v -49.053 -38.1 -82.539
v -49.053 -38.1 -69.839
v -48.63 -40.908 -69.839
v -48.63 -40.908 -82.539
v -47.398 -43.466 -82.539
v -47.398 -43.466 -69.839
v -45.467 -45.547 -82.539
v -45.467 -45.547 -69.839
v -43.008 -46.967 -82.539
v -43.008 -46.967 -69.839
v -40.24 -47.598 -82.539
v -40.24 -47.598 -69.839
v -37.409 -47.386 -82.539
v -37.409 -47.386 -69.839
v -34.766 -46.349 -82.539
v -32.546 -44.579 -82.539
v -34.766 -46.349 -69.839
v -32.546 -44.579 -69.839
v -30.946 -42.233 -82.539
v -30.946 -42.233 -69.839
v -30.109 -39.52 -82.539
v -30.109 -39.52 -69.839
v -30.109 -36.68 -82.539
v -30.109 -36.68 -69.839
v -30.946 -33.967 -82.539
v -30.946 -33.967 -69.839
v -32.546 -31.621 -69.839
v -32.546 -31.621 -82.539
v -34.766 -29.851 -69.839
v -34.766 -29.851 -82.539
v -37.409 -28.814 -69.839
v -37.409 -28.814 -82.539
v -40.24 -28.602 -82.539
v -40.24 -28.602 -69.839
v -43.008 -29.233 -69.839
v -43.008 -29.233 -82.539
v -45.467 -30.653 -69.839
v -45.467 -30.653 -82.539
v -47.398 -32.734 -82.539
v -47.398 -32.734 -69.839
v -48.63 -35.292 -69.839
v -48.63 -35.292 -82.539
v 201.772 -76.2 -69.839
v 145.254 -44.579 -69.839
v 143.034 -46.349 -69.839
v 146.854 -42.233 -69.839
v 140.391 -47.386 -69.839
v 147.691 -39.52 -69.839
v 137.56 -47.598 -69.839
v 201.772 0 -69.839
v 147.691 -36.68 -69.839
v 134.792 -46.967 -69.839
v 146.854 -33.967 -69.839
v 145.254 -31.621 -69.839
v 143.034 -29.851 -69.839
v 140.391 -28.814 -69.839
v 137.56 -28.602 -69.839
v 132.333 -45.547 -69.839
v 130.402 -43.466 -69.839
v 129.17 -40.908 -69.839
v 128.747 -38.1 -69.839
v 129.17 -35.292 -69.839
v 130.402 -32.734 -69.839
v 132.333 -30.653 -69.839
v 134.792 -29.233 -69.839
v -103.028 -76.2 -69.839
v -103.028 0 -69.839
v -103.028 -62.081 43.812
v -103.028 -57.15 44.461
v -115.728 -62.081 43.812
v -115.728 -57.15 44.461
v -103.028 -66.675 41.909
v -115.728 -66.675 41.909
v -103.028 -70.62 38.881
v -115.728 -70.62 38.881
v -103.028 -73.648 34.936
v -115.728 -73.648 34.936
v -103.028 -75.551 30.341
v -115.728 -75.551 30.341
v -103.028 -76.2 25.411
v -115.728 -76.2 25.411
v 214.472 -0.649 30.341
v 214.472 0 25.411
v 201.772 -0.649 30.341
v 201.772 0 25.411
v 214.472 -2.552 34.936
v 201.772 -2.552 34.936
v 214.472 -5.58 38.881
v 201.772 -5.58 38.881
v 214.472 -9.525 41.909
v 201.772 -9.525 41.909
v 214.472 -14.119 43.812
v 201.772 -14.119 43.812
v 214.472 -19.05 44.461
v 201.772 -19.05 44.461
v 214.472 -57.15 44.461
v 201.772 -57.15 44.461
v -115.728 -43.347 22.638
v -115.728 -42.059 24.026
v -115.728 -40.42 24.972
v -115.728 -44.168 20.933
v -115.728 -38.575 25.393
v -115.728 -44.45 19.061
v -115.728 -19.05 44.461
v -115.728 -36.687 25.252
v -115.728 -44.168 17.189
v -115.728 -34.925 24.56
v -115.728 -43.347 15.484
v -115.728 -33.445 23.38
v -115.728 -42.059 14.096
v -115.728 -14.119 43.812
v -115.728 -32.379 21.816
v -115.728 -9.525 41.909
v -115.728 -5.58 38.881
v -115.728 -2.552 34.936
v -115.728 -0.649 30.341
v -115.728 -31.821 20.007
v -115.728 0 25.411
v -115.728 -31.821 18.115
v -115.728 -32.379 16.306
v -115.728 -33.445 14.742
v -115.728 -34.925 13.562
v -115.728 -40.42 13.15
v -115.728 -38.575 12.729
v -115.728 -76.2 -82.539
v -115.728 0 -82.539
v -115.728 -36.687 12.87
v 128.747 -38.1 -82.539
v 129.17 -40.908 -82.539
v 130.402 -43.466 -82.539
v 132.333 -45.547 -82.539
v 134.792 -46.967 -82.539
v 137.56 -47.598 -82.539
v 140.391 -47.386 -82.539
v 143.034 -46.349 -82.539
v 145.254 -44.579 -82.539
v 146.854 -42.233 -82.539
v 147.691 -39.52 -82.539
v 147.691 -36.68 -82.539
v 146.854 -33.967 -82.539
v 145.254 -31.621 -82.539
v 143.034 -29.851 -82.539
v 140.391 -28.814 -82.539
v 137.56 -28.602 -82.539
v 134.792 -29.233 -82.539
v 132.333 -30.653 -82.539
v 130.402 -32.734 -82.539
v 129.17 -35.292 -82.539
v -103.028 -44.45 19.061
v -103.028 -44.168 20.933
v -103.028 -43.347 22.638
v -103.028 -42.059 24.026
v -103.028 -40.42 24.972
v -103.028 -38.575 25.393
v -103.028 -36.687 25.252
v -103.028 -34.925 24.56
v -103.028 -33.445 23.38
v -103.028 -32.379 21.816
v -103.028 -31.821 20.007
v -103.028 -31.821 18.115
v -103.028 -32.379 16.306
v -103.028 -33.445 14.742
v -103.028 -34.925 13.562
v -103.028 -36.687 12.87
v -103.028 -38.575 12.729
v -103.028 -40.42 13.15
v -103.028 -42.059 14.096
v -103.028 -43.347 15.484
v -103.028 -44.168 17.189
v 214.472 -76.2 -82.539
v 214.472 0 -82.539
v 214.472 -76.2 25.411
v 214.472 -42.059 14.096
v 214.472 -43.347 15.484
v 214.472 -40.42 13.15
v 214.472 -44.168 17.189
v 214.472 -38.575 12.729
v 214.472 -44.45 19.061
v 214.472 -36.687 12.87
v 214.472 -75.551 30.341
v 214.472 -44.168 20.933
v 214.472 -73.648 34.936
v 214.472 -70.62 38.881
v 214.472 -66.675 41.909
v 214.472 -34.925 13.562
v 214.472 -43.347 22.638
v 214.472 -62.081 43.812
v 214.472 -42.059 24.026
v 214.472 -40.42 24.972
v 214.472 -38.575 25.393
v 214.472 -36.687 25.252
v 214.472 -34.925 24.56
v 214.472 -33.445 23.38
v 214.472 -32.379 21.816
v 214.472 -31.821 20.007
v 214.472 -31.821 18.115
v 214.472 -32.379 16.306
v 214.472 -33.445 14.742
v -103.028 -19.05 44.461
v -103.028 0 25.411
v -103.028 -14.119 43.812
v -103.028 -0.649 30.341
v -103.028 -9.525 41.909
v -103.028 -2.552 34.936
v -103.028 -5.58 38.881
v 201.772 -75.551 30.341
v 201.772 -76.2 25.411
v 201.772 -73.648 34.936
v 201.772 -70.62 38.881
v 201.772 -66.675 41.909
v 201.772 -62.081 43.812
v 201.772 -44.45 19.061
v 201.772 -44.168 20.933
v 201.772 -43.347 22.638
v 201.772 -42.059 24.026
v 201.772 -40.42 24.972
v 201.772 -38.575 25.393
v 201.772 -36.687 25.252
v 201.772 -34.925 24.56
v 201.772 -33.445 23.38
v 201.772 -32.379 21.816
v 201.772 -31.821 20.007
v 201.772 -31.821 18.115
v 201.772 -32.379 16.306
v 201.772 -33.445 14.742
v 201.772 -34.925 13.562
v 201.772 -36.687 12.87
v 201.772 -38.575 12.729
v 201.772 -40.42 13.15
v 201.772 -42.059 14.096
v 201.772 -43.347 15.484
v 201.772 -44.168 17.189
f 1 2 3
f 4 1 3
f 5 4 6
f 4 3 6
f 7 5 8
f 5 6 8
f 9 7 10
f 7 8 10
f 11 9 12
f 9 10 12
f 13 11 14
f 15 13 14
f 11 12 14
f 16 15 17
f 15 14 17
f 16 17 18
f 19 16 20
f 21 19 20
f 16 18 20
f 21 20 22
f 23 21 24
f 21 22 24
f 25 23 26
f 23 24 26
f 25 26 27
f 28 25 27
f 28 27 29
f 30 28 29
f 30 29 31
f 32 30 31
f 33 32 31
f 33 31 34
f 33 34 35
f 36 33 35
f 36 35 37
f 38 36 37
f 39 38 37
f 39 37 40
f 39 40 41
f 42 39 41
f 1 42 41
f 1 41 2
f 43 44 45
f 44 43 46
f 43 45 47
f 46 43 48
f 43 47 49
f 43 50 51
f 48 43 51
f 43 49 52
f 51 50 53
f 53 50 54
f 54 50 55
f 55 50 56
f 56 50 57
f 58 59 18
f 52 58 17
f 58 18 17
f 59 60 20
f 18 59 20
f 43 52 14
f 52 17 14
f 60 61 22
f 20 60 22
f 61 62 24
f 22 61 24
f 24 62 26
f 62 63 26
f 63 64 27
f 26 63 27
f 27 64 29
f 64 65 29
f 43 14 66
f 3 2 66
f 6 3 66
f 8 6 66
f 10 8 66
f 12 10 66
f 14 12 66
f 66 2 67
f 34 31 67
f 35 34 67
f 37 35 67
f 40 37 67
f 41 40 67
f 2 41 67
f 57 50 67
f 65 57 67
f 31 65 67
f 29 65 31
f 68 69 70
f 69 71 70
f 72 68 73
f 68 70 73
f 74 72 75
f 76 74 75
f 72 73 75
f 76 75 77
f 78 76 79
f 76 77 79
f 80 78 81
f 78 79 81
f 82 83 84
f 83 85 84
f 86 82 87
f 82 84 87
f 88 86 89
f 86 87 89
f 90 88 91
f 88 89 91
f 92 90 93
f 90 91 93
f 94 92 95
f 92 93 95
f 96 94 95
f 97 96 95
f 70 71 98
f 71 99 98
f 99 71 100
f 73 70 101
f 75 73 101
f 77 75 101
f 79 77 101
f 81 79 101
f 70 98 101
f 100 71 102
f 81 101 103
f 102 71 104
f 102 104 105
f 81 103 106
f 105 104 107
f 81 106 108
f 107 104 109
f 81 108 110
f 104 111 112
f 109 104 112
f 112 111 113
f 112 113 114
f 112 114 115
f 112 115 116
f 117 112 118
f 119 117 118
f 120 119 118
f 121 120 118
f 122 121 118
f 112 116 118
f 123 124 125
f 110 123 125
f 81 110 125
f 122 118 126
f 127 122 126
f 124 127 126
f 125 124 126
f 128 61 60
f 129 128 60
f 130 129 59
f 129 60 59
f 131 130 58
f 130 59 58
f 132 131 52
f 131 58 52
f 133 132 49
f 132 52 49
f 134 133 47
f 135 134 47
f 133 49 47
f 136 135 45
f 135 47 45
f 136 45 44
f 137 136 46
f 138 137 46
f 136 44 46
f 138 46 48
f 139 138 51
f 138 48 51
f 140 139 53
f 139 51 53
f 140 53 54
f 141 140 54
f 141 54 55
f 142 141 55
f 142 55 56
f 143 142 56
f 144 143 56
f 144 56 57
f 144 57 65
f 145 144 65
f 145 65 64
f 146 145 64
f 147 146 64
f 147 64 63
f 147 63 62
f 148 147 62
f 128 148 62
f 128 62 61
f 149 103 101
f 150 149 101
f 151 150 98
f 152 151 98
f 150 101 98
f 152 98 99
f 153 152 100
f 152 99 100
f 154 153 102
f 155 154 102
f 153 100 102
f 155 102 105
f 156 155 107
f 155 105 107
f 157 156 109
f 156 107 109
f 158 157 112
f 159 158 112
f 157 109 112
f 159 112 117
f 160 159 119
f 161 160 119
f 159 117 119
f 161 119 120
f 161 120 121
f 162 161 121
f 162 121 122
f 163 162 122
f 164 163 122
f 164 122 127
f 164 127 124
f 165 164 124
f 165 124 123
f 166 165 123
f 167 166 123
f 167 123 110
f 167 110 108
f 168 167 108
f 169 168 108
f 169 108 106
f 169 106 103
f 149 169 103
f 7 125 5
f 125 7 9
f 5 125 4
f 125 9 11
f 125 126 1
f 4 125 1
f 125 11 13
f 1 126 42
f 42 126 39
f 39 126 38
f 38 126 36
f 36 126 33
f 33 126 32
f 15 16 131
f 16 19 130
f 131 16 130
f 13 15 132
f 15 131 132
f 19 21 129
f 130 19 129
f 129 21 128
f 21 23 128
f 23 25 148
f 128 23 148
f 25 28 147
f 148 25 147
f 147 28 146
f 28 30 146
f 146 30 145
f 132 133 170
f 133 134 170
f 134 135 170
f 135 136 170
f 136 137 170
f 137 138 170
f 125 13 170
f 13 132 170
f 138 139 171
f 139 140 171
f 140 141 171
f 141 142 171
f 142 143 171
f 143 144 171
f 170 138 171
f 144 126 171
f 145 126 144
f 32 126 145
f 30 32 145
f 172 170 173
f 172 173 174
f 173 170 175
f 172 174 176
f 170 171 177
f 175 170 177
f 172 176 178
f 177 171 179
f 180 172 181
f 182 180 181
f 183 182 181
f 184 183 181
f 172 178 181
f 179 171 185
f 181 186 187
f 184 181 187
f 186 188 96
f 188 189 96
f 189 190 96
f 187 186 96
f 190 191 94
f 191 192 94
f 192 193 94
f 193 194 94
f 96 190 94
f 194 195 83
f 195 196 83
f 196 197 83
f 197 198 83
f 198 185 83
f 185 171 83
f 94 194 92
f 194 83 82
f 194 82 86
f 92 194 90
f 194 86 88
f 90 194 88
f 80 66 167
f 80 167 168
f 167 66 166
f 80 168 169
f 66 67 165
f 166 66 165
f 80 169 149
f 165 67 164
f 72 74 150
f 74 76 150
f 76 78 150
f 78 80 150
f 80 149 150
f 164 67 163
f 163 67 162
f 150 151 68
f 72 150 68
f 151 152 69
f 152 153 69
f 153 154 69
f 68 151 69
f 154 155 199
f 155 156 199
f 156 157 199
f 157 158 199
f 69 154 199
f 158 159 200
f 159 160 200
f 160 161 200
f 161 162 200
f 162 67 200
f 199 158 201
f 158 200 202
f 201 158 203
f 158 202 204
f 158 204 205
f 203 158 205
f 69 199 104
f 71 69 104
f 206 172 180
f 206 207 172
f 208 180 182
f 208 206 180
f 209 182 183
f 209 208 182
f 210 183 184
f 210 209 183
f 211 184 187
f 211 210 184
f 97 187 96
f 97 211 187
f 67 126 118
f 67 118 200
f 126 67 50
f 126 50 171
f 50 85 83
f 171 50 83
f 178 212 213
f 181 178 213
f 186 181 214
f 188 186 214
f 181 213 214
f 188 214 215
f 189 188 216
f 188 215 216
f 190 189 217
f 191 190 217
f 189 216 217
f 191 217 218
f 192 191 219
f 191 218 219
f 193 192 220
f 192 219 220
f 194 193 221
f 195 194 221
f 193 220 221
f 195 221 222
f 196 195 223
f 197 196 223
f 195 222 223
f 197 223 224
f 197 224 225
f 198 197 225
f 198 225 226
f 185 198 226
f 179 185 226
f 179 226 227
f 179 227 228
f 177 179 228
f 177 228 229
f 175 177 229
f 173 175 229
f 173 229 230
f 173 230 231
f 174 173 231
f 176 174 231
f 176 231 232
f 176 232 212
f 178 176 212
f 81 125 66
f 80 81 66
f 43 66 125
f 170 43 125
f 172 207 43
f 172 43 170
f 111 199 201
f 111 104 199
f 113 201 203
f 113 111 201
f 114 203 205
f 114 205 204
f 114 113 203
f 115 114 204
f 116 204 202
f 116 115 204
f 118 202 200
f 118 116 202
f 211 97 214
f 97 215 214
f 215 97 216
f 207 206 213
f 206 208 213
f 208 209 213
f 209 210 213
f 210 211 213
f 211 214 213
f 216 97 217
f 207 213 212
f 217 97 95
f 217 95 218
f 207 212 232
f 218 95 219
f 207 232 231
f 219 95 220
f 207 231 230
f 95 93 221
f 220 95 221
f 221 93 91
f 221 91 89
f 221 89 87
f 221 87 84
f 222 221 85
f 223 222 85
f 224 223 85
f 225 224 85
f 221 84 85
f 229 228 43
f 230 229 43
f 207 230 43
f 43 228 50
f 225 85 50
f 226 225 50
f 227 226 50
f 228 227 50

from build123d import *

# Parameters (mm, degrees)
F1_DEPTH = 76.2
F3_D     = 12.7
F4_R     = 19.05
F6_D     = 19.05


with BuildPart() as f1:
    # F0 (on Front) → F1 (new body)
    with BuildSketch(Plane.XZ):
        Polygon((-103.028067, 44.460986), (-115.728067, 44.460986), (-115.728067, -82.539014), (214.471933, -82.539014), (214.471933, 44.460986), (201.771933, 44.460986), (201.771933, -69.839014), (-103.028067, -69.839014), align=None)
    extrude(amount=F1_DEPTH)

    # F3 (through all)
    with Locations(Plane.YZ.offset(214.471933)):
        with Locations((-38.1, 19.060986)):
            Hole(F3_D / 2)

    # F4
    f4_edges = [f1.edges().sort_by_distance(p)[0] for p in [
        (208.121933, -76.2, 44.460986),
        (208.121933, 0, 44.460986),
        (-109.378067, -76.2, 44.460986),
        (-109.378067, 0, 44.460986),
    ]]
    fillet(f4_edges, radius=F4_R)

    # F6 (through all)
    with Locations(Plane(origin=(0, 0, -82.539014), x_dir=(1, 0, 0), z_dir=(0, 0, -1))):
        with Locations((-39.528067, 38.1), (138.271933, 38.1)):
            Hole(F6_D / 2)


solid = f1.part
